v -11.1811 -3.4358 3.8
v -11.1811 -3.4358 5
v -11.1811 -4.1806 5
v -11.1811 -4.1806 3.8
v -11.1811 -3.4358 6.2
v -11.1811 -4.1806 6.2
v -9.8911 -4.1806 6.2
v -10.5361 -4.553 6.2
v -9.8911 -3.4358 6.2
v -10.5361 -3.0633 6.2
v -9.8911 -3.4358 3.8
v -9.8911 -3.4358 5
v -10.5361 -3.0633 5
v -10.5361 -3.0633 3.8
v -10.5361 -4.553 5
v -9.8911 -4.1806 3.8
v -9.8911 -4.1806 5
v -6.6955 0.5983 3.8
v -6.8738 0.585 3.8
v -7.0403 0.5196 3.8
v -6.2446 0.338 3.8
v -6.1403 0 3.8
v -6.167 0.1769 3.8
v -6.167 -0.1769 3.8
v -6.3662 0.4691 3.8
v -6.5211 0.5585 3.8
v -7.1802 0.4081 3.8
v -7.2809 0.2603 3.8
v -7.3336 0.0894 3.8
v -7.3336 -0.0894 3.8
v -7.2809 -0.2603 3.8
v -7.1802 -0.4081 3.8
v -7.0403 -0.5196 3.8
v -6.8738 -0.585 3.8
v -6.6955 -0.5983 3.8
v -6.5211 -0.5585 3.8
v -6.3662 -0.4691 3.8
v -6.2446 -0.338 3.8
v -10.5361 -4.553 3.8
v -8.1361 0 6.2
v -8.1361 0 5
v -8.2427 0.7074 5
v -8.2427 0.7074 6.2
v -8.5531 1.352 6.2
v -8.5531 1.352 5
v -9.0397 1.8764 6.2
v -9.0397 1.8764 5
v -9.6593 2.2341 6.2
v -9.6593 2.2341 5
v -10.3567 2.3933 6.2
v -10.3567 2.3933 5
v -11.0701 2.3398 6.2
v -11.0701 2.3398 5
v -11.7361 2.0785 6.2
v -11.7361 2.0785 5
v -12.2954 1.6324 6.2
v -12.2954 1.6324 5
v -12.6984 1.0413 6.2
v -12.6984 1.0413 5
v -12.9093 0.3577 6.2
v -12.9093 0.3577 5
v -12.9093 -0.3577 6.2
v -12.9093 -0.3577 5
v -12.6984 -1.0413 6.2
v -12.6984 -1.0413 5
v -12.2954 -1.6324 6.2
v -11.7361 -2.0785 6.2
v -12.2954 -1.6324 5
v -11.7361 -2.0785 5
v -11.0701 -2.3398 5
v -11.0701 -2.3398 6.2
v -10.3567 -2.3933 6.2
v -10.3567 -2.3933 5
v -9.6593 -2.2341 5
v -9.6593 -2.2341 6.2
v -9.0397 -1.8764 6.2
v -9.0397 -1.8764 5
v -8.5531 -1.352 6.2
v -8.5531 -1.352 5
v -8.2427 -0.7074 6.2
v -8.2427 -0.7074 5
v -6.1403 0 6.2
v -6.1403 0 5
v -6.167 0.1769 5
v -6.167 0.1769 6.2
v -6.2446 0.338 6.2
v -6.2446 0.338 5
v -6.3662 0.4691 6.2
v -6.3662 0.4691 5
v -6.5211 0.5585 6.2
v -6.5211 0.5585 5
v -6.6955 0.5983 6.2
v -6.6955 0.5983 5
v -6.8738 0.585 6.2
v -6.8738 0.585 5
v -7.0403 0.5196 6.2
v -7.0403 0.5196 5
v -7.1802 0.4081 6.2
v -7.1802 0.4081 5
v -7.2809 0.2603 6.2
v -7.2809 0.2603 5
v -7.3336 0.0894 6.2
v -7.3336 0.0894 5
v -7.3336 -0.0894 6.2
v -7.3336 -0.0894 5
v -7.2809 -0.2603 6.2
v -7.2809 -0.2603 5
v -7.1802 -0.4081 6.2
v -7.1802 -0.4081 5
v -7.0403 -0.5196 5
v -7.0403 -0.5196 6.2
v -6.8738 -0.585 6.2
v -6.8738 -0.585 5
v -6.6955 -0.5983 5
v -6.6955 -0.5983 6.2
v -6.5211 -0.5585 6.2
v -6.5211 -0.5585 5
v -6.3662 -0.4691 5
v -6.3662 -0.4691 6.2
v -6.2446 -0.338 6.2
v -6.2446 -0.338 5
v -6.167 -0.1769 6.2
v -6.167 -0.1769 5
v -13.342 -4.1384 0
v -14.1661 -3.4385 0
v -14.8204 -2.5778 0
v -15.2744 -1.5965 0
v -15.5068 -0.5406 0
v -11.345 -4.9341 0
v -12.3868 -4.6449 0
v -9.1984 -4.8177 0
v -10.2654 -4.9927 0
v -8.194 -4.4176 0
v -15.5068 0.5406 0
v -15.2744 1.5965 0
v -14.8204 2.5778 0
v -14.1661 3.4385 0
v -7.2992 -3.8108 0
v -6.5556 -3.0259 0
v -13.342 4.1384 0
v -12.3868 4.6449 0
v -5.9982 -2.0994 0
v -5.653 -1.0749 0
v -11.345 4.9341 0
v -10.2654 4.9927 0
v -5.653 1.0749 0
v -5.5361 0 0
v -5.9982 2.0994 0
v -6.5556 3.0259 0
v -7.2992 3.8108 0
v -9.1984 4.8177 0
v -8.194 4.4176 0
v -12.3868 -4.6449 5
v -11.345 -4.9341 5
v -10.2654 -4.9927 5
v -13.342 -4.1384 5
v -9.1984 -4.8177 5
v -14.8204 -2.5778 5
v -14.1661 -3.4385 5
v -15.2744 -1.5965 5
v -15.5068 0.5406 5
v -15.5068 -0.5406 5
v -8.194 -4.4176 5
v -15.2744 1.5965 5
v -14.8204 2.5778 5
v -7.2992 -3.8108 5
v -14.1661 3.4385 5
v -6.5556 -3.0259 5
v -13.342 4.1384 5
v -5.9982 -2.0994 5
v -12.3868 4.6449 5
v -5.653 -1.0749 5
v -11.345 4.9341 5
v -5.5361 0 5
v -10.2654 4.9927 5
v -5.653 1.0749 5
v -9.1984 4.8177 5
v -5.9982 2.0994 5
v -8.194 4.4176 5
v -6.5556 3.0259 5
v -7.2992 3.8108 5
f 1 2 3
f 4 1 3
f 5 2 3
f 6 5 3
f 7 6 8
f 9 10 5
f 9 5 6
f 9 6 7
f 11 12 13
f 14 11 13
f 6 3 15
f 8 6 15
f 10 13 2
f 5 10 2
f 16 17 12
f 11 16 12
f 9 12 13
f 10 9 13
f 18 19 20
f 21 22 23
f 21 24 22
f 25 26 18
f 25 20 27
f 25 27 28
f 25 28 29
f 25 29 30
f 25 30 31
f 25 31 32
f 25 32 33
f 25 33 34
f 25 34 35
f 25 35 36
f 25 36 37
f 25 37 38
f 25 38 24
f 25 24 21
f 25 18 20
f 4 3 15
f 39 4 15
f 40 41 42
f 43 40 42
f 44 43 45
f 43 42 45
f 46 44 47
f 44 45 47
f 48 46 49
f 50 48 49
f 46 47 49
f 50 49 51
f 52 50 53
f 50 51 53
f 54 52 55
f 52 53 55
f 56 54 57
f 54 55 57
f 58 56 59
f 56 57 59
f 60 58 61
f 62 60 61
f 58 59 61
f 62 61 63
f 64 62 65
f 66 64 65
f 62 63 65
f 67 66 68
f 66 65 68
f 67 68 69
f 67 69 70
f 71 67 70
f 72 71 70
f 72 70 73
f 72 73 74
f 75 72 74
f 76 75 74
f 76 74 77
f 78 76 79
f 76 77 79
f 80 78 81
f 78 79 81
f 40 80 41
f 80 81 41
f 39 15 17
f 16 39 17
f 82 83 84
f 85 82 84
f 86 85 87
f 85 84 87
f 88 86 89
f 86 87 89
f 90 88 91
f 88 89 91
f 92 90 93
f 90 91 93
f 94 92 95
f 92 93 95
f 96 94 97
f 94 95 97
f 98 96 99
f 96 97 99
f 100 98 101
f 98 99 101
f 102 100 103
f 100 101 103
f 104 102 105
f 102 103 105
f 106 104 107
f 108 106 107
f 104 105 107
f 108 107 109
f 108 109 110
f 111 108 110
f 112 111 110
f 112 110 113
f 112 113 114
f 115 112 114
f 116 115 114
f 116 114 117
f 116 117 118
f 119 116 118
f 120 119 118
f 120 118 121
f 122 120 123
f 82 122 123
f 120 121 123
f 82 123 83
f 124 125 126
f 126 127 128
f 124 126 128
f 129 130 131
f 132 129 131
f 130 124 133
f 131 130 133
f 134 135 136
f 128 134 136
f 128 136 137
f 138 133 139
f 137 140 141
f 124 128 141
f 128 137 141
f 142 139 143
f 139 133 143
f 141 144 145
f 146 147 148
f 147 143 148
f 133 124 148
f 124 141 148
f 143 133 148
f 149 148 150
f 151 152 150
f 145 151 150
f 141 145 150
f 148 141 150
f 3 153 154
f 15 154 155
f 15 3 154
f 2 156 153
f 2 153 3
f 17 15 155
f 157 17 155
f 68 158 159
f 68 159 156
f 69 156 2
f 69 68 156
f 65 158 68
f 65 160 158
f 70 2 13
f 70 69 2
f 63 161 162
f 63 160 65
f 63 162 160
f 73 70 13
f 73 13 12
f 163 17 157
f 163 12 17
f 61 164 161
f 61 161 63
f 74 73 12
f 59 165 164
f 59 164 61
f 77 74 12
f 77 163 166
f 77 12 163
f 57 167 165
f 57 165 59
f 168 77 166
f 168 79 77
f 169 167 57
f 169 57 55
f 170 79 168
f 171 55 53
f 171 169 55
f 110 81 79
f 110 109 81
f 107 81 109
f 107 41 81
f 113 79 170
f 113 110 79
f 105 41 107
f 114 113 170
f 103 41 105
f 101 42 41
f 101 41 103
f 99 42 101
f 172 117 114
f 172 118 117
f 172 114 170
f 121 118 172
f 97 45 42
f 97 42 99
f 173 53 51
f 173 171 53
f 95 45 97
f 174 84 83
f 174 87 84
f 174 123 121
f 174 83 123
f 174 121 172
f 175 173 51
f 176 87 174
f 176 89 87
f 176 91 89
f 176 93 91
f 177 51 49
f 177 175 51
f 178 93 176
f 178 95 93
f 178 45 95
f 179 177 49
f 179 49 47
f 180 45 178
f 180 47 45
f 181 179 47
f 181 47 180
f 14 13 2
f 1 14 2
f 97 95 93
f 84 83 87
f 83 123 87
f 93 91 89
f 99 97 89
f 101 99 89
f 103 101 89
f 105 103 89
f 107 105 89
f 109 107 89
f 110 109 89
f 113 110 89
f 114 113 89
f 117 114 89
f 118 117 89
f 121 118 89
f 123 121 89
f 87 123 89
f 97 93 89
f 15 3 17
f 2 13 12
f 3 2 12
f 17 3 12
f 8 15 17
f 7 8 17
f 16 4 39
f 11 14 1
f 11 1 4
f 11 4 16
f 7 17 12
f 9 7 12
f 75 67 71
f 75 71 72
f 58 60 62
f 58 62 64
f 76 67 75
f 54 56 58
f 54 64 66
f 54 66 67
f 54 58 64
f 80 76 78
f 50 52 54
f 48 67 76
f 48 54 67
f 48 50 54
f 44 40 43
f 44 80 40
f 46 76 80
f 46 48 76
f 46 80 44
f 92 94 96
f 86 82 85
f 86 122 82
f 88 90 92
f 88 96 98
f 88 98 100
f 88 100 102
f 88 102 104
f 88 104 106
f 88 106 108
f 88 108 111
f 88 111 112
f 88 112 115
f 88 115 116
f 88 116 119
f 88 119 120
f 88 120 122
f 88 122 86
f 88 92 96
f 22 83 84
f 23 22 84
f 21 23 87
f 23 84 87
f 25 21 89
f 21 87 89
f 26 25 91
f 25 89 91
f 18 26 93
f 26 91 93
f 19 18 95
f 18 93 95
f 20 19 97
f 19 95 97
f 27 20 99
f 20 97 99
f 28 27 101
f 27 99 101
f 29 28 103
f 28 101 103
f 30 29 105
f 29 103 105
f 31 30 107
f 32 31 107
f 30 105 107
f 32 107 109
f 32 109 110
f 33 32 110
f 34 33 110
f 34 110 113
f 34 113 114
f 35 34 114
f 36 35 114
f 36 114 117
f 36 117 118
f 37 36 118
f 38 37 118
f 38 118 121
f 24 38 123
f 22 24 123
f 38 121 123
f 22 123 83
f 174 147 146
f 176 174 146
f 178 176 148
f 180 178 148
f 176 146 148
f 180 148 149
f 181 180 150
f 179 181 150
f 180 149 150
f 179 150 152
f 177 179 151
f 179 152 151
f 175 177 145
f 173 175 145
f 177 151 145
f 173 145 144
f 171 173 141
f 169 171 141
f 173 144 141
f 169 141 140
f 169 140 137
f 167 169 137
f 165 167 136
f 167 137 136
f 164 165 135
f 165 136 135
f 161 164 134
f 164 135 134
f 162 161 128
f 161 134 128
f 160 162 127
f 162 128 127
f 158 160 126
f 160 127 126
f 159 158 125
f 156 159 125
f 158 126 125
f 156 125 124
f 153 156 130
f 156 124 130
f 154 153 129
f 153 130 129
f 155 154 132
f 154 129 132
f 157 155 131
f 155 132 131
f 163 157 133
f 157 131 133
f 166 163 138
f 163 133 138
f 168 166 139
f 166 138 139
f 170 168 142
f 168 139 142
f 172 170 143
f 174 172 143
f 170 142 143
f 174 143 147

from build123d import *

# Parameters (mm, degrees)
F0_R     = 5
F1_DEPTH = 5
F2_R     = 0.6
F3_DEPTH = 1.2
F2_R_2   = 2.4
F4_DEPTH = 1.2


with BuildPart() as f1:
    # F0 (on Top) → F1 (new body)
    with BuildSketch(Plane.XY):
        with Locations((-10.536088, 0)):
            Circle(F0_R)
    extrude(amount=F1_DEPTH)

    # F2 (on face) → F3 (cut)
    with BuildSketch(Plane.XY.offset(5)):
        with Locations((-6.740328, 0)):
            Circle(F2_R)
        Polygon((-9.891057, -4.180577), (-9.891057, -3.435759), (-10.536088, -3.06335), (-11.181119, -3.435759), (-11.181119, -4.180577), (-10.536088, -4.552986), align=None)
    extrude(amount=-F3_DEPTH, mode=Mode.SUBTRACT)

    # F2 (on face) → F4 (join)
    with BuildSketch(Plane.XY.offset(5)):
        with Locations((-10.536088, 0)):
            Circle(F2_R_2)
        with Locations((-6.740328, 0)):
            Circle(F2_R)
        Polygon((-9.891057, -4.180577), (-9.891057, -3.435759), (-10.536088, -3.06335), (-11.181119, -3.435759), (-11.181119, -4.180577), (-10.536088, -4.552986), align=None)
    extrude(amount=F4_DEPTH)


solid = f1.part
